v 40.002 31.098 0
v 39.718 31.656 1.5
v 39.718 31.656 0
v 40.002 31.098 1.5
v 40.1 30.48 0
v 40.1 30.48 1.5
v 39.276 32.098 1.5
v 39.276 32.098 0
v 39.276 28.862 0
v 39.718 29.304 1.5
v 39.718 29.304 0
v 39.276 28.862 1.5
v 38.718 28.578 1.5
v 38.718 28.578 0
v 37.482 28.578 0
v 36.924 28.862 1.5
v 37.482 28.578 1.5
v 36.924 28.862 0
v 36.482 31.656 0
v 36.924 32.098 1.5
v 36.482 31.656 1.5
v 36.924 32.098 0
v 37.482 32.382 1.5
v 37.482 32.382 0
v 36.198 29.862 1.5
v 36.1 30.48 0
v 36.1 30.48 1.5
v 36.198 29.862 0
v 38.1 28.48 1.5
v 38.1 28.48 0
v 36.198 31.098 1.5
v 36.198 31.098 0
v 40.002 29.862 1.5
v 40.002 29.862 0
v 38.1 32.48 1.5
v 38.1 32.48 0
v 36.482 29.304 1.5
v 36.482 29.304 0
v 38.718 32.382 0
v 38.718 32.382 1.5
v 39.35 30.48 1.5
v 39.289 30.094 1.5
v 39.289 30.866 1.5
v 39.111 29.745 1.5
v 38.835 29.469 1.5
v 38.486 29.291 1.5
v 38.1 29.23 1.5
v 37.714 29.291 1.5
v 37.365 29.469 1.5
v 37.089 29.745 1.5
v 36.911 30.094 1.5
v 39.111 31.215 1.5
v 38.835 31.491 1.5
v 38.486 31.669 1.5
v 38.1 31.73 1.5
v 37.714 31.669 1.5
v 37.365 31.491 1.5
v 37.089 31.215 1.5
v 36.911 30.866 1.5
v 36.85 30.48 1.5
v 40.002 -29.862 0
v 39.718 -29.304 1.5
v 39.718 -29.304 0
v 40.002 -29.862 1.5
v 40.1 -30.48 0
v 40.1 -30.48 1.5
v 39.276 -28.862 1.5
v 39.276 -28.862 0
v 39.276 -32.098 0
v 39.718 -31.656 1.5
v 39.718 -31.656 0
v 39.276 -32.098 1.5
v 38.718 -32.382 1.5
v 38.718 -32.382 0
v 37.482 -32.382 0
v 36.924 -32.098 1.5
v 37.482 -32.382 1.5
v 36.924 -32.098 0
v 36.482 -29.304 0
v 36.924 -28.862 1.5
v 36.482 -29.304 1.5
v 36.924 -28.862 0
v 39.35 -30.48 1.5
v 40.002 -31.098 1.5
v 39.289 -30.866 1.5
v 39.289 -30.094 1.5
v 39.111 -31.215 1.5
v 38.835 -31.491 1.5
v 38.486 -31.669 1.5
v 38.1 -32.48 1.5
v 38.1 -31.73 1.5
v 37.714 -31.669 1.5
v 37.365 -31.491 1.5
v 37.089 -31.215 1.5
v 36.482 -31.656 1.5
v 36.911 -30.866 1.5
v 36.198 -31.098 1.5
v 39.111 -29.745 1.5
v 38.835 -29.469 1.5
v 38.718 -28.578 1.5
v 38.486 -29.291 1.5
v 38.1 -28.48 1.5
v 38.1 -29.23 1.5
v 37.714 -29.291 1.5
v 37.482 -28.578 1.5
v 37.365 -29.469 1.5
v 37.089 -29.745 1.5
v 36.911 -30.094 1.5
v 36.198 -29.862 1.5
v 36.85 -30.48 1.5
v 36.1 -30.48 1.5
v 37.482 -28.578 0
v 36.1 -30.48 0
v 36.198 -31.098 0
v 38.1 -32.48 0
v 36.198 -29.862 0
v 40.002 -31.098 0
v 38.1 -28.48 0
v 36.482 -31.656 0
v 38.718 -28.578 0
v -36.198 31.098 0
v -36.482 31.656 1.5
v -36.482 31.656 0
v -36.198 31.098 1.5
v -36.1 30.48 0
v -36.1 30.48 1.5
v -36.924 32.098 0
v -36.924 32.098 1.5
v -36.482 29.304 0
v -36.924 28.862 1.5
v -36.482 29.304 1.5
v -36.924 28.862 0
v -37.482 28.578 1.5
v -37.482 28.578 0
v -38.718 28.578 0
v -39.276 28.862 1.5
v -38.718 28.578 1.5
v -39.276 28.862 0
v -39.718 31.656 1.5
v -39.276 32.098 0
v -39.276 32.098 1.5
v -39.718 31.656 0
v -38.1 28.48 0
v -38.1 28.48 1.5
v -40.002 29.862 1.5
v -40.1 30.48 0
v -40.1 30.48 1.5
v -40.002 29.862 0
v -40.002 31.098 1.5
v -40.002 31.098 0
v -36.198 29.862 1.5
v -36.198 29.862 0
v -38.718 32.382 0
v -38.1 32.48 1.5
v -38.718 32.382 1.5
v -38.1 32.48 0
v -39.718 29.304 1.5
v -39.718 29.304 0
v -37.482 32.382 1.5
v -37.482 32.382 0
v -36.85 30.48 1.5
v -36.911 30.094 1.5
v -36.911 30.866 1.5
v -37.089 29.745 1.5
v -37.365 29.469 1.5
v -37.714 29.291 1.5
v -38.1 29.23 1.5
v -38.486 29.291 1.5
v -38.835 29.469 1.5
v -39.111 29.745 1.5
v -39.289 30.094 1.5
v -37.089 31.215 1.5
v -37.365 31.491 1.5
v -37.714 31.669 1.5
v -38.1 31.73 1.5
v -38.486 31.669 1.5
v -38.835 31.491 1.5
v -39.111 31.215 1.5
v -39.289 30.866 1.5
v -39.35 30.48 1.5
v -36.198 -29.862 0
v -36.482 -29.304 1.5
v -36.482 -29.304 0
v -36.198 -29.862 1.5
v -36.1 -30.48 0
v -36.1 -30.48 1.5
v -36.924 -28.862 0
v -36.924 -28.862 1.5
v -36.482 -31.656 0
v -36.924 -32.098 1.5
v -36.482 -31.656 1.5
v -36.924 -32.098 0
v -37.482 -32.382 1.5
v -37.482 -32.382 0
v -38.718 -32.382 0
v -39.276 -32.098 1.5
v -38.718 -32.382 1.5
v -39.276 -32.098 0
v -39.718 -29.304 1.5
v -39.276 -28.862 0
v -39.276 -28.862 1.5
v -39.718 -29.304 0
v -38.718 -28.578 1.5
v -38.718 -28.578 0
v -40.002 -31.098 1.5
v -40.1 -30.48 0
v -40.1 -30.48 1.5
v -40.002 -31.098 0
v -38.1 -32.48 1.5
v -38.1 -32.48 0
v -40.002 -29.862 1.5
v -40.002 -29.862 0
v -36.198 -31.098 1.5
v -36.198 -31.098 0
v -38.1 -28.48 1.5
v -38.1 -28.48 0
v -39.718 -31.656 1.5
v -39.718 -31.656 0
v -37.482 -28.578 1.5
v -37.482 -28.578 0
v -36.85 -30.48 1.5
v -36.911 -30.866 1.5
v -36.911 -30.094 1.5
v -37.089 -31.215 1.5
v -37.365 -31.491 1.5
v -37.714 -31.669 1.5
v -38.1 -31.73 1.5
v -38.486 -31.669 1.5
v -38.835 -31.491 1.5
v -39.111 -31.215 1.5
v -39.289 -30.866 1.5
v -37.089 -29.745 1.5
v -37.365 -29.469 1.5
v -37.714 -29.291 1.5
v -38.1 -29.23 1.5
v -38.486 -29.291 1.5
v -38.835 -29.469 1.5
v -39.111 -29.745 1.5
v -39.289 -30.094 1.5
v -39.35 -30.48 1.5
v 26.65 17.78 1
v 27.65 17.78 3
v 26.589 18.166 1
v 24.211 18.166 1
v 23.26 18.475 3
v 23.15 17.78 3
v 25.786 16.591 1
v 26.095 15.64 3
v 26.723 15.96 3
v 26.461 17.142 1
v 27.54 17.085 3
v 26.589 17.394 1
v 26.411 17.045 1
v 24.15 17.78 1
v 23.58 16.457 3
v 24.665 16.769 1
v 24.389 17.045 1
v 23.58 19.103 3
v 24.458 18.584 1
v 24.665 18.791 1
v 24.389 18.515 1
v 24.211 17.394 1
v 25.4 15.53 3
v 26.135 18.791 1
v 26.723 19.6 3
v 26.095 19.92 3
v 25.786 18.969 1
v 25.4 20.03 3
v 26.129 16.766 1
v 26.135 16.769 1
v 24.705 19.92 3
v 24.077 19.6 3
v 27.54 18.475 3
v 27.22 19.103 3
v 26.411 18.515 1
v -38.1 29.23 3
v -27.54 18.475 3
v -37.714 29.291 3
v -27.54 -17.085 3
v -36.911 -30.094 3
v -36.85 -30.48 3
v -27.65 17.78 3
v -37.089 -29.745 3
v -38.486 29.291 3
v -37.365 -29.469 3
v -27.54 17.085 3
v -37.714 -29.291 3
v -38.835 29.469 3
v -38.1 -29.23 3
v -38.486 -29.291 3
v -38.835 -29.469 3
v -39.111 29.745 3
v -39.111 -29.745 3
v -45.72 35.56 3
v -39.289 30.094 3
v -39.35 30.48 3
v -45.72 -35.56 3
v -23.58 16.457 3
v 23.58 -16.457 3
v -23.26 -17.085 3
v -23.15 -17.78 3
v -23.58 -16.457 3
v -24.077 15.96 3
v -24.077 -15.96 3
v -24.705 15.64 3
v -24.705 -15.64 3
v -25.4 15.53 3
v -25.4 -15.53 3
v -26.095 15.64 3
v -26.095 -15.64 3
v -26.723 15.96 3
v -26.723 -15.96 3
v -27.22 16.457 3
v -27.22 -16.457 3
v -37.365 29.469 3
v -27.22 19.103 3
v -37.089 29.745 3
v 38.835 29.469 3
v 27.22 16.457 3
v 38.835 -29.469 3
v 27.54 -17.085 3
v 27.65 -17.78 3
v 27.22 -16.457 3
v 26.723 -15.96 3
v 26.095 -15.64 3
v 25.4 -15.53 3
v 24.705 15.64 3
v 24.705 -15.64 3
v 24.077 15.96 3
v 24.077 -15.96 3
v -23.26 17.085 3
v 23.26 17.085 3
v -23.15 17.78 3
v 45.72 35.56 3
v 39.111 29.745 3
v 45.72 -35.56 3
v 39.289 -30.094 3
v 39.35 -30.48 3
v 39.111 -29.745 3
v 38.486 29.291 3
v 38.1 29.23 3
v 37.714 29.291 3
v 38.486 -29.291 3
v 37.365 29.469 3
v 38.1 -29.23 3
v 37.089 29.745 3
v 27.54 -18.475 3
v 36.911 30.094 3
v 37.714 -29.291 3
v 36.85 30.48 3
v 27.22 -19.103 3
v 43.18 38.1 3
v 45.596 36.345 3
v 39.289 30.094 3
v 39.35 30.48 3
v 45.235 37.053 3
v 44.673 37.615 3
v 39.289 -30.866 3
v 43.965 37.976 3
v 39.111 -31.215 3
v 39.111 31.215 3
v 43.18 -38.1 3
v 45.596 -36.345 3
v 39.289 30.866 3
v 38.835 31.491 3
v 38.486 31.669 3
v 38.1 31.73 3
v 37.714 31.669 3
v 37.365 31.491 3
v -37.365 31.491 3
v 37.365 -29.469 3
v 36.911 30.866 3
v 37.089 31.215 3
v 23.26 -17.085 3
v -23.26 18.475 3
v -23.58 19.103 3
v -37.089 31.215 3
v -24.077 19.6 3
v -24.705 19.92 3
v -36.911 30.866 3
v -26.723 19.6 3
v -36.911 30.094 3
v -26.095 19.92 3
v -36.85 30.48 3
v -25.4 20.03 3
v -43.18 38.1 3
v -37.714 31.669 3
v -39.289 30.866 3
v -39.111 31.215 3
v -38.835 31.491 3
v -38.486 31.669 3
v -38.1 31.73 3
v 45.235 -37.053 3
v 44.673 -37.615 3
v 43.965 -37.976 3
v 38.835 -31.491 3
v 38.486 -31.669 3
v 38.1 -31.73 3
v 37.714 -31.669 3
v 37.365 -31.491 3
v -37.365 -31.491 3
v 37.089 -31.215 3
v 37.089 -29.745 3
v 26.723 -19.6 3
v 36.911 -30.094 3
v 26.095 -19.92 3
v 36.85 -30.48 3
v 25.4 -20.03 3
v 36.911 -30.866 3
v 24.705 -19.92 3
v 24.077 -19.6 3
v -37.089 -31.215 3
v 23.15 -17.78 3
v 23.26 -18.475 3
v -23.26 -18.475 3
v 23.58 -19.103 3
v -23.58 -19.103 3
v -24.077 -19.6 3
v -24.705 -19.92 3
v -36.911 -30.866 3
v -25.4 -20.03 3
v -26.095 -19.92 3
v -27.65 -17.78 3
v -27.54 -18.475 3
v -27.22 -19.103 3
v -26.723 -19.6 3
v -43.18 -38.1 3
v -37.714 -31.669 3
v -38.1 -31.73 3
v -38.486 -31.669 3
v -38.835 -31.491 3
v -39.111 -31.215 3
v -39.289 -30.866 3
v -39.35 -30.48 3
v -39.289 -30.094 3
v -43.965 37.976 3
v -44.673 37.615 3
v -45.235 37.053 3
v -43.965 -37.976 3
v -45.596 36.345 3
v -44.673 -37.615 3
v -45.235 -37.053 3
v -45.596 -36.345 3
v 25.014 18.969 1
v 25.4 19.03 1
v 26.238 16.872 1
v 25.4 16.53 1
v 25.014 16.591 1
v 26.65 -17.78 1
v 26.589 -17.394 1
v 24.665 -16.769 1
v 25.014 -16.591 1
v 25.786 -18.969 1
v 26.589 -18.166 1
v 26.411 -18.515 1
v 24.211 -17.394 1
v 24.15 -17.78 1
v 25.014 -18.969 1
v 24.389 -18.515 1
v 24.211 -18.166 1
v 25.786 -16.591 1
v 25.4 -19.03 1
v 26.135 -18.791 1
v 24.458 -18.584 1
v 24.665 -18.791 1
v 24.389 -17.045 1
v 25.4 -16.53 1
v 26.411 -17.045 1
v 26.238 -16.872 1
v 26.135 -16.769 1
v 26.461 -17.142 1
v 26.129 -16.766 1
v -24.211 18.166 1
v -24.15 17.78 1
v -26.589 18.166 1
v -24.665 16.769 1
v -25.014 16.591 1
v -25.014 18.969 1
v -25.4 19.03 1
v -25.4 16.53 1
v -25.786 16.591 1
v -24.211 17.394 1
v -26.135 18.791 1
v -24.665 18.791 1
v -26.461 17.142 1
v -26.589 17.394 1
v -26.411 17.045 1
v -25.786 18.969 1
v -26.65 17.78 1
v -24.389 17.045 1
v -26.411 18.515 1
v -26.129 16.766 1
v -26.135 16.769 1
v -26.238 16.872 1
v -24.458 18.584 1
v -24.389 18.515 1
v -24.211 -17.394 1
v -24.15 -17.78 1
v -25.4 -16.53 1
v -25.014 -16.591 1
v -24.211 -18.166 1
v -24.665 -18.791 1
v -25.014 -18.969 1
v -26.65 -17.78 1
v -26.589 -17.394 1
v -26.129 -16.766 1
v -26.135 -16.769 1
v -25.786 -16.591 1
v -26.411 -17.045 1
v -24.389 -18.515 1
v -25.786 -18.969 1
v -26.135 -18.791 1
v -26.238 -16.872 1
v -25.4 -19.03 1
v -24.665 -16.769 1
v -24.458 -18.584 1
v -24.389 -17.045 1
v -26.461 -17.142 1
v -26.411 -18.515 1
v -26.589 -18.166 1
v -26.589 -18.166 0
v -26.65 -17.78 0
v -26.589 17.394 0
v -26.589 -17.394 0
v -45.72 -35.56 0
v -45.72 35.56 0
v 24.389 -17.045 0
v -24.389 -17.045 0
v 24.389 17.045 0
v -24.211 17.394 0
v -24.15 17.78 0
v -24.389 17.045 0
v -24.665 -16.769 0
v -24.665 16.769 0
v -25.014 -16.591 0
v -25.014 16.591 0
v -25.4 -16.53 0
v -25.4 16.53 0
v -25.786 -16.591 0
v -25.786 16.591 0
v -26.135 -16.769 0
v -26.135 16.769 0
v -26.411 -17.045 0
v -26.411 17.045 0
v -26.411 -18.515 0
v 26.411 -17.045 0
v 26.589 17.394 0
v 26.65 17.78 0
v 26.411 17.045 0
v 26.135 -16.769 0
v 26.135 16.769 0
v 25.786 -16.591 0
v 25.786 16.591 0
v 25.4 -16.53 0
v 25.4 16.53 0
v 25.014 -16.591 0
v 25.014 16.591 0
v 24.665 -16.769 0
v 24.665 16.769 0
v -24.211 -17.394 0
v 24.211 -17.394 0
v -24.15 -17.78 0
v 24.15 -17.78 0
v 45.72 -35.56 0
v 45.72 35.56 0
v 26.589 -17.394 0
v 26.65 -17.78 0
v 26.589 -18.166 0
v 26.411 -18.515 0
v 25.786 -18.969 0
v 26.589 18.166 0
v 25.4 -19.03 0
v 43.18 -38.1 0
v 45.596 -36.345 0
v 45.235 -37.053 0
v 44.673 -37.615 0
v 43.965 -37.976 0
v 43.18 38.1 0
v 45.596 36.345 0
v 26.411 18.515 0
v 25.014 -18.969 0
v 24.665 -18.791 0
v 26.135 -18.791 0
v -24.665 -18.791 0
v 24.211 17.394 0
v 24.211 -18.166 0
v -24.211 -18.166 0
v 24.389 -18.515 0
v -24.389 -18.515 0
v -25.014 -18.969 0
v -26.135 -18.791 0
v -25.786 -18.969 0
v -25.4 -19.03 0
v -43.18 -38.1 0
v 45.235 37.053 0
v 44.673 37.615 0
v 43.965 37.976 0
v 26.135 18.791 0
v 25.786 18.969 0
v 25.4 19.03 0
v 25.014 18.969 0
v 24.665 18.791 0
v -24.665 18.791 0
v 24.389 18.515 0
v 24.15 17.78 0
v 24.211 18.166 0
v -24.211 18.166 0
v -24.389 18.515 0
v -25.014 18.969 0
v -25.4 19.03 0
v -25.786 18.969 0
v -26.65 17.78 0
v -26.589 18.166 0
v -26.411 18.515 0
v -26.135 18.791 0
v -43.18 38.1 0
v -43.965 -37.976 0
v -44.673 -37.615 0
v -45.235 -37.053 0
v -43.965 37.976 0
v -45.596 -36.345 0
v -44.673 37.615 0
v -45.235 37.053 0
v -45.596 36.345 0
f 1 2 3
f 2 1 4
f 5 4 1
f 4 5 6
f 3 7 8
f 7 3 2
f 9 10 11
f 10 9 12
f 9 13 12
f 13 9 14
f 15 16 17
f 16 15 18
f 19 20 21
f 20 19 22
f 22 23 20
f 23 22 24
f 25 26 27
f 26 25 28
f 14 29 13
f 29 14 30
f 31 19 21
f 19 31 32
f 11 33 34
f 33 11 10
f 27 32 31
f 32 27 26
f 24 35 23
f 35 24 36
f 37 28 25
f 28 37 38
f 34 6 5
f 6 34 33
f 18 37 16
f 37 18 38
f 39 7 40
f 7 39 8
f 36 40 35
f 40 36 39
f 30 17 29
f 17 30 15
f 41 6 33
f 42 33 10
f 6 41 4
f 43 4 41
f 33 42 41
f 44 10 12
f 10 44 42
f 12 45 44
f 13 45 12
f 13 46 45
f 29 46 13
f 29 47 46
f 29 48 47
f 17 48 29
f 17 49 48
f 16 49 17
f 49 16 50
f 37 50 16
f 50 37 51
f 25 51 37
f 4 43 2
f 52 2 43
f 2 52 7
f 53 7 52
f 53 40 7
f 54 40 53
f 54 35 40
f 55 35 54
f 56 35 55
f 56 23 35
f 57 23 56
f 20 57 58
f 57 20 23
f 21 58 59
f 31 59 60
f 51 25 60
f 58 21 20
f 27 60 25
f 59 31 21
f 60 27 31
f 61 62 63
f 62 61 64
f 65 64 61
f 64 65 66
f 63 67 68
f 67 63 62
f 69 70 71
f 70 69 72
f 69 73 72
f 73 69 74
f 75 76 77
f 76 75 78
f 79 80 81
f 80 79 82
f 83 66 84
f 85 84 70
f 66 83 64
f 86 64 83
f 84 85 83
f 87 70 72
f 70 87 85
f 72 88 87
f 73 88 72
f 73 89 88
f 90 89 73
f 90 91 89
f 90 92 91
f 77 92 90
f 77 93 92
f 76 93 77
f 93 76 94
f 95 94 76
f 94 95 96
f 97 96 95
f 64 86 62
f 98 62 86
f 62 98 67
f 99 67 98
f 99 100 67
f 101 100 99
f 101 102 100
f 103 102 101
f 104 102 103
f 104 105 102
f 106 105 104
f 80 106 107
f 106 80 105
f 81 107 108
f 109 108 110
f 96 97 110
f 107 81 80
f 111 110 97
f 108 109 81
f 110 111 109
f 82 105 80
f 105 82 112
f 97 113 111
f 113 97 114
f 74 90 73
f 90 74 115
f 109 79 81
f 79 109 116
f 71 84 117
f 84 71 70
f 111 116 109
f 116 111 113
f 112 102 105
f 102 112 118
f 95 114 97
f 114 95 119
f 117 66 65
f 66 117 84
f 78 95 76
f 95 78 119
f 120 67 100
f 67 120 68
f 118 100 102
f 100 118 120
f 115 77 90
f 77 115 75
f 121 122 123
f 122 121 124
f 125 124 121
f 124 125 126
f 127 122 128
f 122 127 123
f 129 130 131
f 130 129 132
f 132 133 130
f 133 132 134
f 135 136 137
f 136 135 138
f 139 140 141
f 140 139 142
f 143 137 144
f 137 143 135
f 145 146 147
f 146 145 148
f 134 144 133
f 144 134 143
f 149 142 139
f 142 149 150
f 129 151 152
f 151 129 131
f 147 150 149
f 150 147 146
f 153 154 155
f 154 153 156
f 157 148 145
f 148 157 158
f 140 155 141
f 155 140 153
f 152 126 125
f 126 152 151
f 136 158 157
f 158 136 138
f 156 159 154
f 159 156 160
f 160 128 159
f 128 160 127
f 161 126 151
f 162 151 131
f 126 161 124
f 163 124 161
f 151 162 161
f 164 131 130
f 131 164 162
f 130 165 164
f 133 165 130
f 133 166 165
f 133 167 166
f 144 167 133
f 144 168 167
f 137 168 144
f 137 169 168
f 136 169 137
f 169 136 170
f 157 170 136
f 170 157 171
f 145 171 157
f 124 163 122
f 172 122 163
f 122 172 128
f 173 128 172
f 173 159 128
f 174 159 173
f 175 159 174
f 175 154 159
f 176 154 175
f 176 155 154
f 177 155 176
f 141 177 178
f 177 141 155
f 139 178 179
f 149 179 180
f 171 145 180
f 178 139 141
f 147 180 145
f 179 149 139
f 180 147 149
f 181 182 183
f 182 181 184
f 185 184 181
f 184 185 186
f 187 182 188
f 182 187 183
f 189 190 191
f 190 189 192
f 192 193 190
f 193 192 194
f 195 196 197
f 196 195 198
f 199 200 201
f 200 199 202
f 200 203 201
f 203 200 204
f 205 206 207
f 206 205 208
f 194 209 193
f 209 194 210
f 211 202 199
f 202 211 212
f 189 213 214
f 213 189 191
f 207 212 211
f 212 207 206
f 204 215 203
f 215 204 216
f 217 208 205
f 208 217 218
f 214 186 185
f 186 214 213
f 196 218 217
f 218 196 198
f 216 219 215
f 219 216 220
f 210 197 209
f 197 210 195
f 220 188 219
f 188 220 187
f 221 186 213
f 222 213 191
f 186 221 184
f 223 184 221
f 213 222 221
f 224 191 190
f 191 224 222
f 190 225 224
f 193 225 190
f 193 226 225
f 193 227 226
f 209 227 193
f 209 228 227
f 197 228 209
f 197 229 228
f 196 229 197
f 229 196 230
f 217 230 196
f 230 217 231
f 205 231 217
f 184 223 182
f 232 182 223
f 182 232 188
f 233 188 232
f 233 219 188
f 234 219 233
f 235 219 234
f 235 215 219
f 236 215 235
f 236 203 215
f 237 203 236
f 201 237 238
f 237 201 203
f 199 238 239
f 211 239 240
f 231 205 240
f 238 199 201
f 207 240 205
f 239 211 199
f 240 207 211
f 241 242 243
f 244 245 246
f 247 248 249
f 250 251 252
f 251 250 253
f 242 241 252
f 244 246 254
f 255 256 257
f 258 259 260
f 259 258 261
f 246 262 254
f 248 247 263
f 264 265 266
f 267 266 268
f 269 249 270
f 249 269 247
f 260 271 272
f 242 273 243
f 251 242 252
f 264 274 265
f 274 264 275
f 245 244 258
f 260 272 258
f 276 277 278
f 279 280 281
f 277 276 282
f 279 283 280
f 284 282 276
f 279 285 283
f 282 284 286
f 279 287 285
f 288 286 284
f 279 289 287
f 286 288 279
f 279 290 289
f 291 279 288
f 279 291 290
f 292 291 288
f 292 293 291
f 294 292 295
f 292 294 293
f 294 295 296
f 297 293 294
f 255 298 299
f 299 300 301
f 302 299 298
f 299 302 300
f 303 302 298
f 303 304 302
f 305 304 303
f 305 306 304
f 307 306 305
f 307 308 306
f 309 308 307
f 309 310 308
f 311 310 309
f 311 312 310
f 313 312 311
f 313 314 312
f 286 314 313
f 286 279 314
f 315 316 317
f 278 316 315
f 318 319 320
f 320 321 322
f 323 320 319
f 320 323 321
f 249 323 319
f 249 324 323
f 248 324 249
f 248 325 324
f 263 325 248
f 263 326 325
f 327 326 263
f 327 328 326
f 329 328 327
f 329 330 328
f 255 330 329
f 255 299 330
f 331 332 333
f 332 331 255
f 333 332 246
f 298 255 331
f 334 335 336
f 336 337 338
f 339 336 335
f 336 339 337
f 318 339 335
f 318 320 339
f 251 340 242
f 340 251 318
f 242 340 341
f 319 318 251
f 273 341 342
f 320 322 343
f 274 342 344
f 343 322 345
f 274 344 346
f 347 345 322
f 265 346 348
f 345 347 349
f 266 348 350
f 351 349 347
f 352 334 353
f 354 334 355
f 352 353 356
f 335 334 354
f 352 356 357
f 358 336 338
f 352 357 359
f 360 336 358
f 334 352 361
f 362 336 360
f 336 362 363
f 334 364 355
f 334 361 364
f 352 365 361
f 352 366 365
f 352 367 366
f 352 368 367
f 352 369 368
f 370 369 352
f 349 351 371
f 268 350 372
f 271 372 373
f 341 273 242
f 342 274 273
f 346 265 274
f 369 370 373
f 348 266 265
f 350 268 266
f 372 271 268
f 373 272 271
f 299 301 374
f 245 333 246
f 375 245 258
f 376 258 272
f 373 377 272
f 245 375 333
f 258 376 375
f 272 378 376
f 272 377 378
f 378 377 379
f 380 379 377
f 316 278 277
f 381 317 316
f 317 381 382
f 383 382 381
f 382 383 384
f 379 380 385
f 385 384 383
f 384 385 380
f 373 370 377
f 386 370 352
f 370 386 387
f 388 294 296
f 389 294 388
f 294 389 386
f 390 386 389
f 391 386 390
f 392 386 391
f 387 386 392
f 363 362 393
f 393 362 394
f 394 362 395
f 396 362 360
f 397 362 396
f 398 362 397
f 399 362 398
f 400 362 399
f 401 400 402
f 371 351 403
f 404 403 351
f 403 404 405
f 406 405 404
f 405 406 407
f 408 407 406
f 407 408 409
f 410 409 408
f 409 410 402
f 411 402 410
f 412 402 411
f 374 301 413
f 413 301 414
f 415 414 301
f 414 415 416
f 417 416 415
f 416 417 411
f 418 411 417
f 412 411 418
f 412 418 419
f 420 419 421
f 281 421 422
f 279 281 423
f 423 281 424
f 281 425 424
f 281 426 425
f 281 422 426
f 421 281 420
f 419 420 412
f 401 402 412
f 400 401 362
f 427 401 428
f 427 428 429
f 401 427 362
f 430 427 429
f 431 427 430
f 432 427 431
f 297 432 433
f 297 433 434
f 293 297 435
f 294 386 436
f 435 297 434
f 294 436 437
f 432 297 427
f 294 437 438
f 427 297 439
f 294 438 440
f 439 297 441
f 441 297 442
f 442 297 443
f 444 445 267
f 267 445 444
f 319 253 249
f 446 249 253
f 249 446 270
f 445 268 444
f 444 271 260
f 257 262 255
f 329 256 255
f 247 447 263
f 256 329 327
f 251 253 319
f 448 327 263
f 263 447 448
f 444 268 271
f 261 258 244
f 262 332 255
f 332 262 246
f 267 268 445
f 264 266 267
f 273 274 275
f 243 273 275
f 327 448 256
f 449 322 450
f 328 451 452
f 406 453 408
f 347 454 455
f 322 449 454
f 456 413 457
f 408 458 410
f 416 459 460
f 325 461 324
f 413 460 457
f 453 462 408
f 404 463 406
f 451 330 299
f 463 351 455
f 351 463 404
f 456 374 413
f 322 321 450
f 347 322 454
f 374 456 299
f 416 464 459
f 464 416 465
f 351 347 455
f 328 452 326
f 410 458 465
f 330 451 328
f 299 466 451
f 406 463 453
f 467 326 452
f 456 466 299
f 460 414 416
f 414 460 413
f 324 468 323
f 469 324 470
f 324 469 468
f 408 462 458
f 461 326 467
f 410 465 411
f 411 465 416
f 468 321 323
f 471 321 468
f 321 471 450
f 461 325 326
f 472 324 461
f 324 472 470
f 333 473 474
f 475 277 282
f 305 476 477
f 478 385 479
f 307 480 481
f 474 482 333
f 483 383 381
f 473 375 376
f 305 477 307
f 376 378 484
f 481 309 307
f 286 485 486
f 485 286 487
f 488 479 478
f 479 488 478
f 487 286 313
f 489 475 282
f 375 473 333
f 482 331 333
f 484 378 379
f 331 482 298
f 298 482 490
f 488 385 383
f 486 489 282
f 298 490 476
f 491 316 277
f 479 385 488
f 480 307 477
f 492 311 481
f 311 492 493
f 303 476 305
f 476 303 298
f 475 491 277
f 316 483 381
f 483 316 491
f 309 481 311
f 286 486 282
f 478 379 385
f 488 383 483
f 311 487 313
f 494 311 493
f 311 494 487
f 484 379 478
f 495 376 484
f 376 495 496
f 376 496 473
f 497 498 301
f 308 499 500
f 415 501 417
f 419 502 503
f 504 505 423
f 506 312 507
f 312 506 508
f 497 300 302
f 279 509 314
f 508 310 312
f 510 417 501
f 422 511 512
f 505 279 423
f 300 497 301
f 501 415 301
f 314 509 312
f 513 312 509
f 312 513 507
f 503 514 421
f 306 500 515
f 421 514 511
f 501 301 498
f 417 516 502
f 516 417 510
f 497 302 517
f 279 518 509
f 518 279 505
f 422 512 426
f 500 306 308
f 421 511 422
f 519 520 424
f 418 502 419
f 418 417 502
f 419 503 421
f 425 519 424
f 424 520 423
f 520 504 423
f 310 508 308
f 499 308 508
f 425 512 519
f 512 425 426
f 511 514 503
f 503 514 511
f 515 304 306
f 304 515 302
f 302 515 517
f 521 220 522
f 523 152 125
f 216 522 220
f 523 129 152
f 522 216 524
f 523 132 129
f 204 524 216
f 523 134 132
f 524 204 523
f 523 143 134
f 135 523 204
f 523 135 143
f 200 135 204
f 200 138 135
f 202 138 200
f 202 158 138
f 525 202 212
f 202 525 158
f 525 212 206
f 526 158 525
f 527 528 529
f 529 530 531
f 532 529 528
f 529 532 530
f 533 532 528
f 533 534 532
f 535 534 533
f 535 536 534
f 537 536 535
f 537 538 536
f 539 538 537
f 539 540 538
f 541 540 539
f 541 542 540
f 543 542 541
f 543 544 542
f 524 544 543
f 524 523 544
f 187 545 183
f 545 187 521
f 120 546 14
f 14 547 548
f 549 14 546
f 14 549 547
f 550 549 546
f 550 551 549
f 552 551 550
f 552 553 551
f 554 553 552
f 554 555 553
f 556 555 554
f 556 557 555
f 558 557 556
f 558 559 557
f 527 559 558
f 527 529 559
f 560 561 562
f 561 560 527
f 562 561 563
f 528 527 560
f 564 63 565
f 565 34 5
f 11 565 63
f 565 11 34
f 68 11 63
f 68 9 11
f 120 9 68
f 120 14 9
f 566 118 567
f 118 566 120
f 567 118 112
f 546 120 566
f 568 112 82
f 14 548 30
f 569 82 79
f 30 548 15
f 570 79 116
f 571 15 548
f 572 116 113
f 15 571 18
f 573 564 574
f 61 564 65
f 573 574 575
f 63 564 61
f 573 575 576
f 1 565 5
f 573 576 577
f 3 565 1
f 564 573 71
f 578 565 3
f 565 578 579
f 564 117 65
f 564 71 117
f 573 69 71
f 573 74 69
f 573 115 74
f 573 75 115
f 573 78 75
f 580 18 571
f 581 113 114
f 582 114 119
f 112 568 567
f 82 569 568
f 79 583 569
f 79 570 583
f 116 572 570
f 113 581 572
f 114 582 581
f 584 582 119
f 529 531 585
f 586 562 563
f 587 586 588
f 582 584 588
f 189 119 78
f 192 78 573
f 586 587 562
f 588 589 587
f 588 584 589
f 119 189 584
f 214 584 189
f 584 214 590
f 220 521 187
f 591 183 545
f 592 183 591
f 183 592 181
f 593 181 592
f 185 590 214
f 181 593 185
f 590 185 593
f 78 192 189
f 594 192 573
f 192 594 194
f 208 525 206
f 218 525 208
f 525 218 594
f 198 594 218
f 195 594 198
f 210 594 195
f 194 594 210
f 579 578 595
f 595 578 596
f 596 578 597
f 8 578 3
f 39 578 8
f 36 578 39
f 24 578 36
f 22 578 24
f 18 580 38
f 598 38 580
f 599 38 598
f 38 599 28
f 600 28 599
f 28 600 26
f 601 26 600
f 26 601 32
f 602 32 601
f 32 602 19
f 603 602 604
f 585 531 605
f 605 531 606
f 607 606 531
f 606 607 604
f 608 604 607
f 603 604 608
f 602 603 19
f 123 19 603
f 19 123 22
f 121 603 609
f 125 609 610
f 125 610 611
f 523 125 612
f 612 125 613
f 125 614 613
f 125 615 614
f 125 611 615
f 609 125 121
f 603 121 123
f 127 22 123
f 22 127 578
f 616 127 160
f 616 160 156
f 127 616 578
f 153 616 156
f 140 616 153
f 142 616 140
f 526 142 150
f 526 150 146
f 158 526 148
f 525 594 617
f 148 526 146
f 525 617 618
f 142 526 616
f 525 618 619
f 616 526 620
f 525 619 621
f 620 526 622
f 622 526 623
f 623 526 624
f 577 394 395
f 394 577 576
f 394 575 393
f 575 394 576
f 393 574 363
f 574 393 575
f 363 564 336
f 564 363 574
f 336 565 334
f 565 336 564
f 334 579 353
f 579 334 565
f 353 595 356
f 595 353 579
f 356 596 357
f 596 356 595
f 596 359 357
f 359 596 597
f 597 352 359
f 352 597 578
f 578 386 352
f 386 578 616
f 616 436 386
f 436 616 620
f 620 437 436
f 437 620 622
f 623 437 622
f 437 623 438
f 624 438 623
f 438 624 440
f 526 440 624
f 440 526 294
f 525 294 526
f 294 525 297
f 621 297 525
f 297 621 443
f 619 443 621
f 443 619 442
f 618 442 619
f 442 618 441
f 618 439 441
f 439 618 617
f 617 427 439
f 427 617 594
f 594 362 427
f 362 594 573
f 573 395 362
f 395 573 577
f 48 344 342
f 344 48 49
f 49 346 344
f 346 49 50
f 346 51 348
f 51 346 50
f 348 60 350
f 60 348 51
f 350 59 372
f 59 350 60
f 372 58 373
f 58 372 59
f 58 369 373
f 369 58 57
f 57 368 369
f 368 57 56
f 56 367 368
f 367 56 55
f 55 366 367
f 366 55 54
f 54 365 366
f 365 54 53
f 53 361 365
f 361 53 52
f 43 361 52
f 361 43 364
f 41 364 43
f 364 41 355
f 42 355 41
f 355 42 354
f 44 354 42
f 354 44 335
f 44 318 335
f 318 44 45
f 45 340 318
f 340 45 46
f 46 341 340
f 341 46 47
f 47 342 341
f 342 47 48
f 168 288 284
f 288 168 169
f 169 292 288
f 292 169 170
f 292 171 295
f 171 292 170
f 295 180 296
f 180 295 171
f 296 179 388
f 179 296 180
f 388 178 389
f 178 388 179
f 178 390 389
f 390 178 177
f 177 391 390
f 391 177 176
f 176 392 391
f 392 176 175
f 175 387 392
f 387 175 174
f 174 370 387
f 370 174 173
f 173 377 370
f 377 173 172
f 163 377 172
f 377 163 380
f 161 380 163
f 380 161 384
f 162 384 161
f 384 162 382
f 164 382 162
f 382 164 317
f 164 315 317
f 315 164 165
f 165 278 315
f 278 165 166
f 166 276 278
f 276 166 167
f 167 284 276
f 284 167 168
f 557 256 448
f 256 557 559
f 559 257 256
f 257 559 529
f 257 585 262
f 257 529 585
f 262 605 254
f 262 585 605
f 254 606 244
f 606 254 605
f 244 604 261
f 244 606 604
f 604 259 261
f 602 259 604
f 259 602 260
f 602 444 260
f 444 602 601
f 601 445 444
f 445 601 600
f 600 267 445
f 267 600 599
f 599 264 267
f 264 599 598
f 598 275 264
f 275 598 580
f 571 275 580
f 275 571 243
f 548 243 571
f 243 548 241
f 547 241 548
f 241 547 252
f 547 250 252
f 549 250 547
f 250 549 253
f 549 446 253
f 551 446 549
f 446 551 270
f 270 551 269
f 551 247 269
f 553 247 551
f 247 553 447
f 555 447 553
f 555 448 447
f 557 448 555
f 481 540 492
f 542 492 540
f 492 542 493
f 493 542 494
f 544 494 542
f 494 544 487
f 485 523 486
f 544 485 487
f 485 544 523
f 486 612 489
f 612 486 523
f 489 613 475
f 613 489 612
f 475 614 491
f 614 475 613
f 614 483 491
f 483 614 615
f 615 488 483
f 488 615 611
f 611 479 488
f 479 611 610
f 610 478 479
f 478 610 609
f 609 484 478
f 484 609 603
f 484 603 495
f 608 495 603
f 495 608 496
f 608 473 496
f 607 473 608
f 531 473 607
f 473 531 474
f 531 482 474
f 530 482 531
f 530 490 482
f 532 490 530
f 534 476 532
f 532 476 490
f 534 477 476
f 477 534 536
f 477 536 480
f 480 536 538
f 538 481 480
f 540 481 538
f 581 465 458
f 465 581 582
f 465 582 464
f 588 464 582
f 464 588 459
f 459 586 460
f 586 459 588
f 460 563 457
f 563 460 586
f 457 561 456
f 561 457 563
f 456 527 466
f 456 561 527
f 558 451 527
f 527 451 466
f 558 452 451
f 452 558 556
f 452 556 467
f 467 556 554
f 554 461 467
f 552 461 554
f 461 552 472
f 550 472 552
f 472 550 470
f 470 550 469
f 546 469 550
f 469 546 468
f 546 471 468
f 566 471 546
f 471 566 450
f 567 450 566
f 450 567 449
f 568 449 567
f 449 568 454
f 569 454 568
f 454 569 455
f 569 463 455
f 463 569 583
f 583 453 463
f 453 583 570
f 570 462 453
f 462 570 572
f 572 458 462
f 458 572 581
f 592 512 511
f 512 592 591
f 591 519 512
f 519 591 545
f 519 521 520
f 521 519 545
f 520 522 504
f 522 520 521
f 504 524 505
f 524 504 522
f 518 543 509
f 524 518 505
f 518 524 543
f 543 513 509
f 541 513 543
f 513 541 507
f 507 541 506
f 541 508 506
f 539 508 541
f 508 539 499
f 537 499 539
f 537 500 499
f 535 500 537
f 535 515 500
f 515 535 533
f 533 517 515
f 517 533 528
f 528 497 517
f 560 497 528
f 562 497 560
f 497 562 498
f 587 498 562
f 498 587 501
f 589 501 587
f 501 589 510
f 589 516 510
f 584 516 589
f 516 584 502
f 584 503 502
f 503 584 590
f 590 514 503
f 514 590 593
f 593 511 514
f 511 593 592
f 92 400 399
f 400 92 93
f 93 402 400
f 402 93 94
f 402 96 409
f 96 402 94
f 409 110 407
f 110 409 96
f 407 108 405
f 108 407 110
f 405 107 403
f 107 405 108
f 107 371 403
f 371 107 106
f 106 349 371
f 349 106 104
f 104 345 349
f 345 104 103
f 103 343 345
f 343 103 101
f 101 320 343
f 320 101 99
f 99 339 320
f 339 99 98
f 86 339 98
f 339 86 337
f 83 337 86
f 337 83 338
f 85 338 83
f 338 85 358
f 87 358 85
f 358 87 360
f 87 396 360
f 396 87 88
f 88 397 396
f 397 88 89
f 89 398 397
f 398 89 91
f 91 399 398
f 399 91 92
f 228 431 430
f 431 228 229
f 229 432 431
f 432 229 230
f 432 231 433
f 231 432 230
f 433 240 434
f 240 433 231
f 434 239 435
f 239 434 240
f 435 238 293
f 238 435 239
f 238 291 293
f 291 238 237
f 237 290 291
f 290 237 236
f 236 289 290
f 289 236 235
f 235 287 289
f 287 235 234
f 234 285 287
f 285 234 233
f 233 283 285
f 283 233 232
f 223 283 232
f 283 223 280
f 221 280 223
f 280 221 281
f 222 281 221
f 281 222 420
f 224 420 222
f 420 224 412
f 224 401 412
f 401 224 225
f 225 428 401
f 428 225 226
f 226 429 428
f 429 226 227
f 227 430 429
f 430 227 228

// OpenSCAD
G = 2.54; /* 2.54mm grid */
T = 3; /* thickness */
$fn = 20;

difference() {
    linear_extrude(T) difference() {
        minkowski() {
            square([34*G,28*G], center=true);
            circle(G);
        }
        /* machine screw holes: */
        for (i = [1,-1]) {
            for (j = [1,-1]) {
                translate([i*15*G,j*12*G])
                    circle(d=2.5);
            }
        }
        /* wood screw holes: */
        for (i = [1,-1]) {
            for (j = [1,-1]) {
                translate([i*10*G,j*7*G])
                    circle(d=2.5);
            }
        }
    }
    /* machine screw countersinks: */
    for (i = [1,-1]) {
        for (j = [1,-1]) {
            translate([i*15*G,j*12*G,-.5])
                cylinder(d=4, h=2);
        }
    }
    /* wood screw countersinks: */
    for (i = [1,-1]) {
        for (j = [1,-1]) {
            translate([i*10*G,j*7*G, 1])
                cylinder(d1=2.5, d2=4.5, h=2);
        }
    }
}
